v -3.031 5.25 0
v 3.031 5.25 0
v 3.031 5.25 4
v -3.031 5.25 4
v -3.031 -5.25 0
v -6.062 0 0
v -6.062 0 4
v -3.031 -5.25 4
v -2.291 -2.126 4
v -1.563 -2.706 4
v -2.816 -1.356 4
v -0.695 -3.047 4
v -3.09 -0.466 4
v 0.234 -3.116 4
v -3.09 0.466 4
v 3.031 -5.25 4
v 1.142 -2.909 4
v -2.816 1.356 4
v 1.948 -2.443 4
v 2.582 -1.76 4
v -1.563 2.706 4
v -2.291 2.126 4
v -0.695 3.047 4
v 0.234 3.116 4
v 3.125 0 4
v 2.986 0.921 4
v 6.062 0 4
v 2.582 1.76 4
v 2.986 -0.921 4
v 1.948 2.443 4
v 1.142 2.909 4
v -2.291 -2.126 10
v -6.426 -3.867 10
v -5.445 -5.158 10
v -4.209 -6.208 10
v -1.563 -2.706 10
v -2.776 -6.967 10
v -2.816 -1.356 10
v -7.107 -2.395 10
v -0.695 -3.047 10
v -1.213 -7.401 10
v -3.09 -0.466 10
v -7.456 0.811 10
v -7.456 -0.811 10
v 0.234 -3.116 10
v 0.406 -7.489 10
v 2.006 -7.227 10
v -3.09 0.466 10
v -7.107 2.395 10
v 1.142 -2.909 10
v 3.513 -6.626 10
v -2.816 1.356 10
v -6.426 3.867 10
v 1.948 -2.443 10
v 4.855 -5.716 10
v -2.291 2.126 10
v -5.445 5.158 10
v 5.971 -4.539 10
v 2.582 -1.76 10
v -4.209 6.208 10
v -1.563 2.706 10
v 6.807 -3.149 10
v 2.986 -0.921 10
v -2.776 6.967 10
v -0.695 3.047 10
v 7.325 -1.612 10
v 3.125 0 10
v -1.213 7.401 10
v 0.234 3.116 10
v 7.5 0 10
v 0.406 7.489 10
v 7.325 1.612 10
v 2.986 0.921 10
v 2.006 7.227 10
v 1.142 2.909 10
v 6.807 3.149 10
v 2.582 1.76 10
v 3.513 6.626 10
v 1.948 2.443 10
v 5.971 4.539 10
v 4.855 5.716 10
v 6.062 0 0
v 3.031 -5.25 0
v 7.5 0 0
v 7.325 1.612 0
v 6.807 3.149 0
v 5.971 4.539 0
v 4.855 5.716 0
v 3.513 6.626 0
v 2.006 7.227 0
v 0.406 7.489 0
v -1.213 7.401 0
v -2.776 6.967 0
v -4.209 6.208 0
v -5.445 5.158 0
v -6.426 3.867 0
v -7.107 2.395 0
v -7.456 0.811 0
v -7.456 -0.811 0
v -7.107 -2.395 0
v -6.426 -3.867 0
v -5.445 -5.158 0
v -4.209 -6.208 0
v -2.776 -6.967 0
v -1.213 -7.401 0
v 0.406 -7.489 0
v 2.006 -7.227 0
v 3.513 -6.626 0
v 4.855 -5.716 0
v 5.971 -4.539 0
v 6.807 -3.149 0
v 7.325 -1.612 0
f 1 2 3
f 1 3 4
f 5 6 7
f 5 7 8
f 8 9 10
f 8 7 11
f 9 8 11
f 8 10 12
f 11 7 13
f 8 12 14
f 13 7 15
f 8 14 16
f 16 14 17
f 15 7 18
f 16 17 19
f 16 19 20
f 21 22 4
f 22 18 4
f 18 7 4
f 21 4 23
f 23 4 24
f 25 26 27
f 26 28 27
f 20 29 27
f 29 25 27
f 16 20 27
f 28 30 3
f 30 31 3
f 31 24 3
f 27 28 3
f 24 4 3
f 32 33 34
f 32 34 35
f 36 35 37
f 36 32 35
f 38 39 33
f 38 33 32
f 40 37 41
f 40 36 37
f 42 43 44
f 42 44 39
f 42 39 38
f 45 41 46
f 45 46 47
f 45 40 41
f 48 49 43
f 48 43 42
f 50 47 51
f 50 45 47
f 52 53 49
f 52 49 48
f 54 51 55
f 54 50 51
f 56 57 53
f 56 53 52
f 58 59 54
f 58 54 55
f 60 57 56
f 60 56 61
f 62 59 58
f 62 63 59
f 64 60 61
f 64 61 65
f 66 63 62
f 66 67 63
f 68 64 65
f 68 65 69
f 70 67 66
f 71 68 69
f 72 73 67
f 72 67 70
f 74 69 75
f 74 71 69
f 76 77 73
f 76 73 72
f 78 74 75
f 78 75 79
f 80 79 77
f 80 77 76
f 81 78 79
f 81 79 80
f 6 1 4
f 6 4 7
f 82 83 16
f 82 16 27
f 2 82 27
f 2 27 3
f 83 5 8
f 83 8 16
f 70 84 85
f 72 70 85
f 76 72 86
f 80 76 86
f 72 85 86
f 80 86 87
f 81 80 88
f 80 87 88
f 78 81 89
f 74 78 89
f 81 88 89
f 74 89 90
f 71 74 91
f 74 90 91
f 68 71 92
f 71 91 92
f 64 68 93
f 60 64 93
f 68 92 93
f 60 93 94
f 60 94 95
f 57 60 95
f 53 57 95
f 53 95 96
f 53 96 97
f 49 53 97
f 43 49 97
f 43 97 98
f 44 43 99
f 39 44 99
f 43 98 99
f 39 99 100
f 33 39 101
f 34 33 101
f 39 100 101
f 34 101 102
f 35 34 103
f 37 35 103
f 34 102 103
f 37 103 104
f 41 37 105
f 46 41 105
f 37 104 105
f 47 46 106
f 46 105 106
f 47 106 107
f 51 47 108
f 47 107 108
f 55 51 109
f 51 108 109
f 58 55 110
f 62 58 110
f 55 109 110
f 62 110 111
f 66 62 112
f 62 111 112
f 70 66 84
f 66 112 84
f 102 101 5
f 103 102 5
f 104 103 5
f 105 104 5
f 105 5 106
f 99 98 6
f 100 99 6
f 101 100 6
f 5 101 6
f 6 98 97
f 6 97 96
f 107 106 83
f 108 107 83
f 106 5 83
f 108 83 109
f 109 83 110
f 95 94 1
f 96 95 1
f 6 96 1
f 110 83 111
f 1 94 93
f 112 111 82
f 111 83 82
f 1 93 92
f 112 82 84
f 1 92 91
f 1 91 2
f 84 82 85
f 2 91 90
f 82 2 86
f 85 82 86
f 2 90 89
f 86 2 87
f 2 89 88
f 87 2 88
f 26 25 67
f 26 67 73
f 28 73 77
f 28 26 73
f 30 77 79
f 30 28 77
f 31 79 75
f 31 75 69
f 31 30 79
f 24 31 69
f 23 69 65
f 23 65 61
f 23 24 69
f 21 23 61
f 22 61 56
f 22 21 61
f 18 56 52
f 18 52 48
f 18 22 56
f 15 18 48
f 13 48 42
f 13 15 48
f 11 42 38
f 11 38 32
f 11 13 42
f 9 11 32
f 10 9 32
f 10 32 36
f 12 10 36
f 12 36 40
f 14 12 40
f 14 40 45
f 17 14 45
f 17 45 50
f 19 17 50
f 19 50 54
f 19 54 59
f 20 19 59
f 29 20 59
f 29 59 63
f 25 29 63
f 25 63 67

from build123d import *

# Parameters (mm, degrees)
F0_R     = 7.5
F0_R_2   = 3.125
F1_DEPTH = 10
F2_DEPTH = 4


with BuildPart() as f1:
    # F0 (on Top) → F1 (new body)
    with BuildSketch(Plane.XY):
        Circle(F0_R)
        Polygon((3.031089, 5.25), (6.062178, 0), (3.031089, -5.25), (-3.031089, -5.25), (-6.062178, 0), (-3.031089, 5.25), align=None, mode=Mode.SUBTRACT)
        Polygon((3.031089, -5.25), (6.062178, 0), (3.031089, 5.25), (-3.031089, 5.25), (-6.062178, 0), (-3.031089, -5.25), align=None)
        Circle(F0_R_2, mode=Mode.SUBTRACT)
    extrude(amount=F1_DEPTH)

    # F0 (on Top) → F2 (cut)
    with BuildSketch(Plane.XY):
        Polygon((3.031089, -5.25), (6.062178, 0), (3.031089, 5.25), (-3.031089, 5.25), (-6.062178, 0), (-3.031089, -5.25), align=None)
        Circle(F0_R_2, mode=Mode.SUBTRACT)
    extrude(amount=F2_DEPTH, mode=Mode.SUBTRACT)


solid = f1.part
